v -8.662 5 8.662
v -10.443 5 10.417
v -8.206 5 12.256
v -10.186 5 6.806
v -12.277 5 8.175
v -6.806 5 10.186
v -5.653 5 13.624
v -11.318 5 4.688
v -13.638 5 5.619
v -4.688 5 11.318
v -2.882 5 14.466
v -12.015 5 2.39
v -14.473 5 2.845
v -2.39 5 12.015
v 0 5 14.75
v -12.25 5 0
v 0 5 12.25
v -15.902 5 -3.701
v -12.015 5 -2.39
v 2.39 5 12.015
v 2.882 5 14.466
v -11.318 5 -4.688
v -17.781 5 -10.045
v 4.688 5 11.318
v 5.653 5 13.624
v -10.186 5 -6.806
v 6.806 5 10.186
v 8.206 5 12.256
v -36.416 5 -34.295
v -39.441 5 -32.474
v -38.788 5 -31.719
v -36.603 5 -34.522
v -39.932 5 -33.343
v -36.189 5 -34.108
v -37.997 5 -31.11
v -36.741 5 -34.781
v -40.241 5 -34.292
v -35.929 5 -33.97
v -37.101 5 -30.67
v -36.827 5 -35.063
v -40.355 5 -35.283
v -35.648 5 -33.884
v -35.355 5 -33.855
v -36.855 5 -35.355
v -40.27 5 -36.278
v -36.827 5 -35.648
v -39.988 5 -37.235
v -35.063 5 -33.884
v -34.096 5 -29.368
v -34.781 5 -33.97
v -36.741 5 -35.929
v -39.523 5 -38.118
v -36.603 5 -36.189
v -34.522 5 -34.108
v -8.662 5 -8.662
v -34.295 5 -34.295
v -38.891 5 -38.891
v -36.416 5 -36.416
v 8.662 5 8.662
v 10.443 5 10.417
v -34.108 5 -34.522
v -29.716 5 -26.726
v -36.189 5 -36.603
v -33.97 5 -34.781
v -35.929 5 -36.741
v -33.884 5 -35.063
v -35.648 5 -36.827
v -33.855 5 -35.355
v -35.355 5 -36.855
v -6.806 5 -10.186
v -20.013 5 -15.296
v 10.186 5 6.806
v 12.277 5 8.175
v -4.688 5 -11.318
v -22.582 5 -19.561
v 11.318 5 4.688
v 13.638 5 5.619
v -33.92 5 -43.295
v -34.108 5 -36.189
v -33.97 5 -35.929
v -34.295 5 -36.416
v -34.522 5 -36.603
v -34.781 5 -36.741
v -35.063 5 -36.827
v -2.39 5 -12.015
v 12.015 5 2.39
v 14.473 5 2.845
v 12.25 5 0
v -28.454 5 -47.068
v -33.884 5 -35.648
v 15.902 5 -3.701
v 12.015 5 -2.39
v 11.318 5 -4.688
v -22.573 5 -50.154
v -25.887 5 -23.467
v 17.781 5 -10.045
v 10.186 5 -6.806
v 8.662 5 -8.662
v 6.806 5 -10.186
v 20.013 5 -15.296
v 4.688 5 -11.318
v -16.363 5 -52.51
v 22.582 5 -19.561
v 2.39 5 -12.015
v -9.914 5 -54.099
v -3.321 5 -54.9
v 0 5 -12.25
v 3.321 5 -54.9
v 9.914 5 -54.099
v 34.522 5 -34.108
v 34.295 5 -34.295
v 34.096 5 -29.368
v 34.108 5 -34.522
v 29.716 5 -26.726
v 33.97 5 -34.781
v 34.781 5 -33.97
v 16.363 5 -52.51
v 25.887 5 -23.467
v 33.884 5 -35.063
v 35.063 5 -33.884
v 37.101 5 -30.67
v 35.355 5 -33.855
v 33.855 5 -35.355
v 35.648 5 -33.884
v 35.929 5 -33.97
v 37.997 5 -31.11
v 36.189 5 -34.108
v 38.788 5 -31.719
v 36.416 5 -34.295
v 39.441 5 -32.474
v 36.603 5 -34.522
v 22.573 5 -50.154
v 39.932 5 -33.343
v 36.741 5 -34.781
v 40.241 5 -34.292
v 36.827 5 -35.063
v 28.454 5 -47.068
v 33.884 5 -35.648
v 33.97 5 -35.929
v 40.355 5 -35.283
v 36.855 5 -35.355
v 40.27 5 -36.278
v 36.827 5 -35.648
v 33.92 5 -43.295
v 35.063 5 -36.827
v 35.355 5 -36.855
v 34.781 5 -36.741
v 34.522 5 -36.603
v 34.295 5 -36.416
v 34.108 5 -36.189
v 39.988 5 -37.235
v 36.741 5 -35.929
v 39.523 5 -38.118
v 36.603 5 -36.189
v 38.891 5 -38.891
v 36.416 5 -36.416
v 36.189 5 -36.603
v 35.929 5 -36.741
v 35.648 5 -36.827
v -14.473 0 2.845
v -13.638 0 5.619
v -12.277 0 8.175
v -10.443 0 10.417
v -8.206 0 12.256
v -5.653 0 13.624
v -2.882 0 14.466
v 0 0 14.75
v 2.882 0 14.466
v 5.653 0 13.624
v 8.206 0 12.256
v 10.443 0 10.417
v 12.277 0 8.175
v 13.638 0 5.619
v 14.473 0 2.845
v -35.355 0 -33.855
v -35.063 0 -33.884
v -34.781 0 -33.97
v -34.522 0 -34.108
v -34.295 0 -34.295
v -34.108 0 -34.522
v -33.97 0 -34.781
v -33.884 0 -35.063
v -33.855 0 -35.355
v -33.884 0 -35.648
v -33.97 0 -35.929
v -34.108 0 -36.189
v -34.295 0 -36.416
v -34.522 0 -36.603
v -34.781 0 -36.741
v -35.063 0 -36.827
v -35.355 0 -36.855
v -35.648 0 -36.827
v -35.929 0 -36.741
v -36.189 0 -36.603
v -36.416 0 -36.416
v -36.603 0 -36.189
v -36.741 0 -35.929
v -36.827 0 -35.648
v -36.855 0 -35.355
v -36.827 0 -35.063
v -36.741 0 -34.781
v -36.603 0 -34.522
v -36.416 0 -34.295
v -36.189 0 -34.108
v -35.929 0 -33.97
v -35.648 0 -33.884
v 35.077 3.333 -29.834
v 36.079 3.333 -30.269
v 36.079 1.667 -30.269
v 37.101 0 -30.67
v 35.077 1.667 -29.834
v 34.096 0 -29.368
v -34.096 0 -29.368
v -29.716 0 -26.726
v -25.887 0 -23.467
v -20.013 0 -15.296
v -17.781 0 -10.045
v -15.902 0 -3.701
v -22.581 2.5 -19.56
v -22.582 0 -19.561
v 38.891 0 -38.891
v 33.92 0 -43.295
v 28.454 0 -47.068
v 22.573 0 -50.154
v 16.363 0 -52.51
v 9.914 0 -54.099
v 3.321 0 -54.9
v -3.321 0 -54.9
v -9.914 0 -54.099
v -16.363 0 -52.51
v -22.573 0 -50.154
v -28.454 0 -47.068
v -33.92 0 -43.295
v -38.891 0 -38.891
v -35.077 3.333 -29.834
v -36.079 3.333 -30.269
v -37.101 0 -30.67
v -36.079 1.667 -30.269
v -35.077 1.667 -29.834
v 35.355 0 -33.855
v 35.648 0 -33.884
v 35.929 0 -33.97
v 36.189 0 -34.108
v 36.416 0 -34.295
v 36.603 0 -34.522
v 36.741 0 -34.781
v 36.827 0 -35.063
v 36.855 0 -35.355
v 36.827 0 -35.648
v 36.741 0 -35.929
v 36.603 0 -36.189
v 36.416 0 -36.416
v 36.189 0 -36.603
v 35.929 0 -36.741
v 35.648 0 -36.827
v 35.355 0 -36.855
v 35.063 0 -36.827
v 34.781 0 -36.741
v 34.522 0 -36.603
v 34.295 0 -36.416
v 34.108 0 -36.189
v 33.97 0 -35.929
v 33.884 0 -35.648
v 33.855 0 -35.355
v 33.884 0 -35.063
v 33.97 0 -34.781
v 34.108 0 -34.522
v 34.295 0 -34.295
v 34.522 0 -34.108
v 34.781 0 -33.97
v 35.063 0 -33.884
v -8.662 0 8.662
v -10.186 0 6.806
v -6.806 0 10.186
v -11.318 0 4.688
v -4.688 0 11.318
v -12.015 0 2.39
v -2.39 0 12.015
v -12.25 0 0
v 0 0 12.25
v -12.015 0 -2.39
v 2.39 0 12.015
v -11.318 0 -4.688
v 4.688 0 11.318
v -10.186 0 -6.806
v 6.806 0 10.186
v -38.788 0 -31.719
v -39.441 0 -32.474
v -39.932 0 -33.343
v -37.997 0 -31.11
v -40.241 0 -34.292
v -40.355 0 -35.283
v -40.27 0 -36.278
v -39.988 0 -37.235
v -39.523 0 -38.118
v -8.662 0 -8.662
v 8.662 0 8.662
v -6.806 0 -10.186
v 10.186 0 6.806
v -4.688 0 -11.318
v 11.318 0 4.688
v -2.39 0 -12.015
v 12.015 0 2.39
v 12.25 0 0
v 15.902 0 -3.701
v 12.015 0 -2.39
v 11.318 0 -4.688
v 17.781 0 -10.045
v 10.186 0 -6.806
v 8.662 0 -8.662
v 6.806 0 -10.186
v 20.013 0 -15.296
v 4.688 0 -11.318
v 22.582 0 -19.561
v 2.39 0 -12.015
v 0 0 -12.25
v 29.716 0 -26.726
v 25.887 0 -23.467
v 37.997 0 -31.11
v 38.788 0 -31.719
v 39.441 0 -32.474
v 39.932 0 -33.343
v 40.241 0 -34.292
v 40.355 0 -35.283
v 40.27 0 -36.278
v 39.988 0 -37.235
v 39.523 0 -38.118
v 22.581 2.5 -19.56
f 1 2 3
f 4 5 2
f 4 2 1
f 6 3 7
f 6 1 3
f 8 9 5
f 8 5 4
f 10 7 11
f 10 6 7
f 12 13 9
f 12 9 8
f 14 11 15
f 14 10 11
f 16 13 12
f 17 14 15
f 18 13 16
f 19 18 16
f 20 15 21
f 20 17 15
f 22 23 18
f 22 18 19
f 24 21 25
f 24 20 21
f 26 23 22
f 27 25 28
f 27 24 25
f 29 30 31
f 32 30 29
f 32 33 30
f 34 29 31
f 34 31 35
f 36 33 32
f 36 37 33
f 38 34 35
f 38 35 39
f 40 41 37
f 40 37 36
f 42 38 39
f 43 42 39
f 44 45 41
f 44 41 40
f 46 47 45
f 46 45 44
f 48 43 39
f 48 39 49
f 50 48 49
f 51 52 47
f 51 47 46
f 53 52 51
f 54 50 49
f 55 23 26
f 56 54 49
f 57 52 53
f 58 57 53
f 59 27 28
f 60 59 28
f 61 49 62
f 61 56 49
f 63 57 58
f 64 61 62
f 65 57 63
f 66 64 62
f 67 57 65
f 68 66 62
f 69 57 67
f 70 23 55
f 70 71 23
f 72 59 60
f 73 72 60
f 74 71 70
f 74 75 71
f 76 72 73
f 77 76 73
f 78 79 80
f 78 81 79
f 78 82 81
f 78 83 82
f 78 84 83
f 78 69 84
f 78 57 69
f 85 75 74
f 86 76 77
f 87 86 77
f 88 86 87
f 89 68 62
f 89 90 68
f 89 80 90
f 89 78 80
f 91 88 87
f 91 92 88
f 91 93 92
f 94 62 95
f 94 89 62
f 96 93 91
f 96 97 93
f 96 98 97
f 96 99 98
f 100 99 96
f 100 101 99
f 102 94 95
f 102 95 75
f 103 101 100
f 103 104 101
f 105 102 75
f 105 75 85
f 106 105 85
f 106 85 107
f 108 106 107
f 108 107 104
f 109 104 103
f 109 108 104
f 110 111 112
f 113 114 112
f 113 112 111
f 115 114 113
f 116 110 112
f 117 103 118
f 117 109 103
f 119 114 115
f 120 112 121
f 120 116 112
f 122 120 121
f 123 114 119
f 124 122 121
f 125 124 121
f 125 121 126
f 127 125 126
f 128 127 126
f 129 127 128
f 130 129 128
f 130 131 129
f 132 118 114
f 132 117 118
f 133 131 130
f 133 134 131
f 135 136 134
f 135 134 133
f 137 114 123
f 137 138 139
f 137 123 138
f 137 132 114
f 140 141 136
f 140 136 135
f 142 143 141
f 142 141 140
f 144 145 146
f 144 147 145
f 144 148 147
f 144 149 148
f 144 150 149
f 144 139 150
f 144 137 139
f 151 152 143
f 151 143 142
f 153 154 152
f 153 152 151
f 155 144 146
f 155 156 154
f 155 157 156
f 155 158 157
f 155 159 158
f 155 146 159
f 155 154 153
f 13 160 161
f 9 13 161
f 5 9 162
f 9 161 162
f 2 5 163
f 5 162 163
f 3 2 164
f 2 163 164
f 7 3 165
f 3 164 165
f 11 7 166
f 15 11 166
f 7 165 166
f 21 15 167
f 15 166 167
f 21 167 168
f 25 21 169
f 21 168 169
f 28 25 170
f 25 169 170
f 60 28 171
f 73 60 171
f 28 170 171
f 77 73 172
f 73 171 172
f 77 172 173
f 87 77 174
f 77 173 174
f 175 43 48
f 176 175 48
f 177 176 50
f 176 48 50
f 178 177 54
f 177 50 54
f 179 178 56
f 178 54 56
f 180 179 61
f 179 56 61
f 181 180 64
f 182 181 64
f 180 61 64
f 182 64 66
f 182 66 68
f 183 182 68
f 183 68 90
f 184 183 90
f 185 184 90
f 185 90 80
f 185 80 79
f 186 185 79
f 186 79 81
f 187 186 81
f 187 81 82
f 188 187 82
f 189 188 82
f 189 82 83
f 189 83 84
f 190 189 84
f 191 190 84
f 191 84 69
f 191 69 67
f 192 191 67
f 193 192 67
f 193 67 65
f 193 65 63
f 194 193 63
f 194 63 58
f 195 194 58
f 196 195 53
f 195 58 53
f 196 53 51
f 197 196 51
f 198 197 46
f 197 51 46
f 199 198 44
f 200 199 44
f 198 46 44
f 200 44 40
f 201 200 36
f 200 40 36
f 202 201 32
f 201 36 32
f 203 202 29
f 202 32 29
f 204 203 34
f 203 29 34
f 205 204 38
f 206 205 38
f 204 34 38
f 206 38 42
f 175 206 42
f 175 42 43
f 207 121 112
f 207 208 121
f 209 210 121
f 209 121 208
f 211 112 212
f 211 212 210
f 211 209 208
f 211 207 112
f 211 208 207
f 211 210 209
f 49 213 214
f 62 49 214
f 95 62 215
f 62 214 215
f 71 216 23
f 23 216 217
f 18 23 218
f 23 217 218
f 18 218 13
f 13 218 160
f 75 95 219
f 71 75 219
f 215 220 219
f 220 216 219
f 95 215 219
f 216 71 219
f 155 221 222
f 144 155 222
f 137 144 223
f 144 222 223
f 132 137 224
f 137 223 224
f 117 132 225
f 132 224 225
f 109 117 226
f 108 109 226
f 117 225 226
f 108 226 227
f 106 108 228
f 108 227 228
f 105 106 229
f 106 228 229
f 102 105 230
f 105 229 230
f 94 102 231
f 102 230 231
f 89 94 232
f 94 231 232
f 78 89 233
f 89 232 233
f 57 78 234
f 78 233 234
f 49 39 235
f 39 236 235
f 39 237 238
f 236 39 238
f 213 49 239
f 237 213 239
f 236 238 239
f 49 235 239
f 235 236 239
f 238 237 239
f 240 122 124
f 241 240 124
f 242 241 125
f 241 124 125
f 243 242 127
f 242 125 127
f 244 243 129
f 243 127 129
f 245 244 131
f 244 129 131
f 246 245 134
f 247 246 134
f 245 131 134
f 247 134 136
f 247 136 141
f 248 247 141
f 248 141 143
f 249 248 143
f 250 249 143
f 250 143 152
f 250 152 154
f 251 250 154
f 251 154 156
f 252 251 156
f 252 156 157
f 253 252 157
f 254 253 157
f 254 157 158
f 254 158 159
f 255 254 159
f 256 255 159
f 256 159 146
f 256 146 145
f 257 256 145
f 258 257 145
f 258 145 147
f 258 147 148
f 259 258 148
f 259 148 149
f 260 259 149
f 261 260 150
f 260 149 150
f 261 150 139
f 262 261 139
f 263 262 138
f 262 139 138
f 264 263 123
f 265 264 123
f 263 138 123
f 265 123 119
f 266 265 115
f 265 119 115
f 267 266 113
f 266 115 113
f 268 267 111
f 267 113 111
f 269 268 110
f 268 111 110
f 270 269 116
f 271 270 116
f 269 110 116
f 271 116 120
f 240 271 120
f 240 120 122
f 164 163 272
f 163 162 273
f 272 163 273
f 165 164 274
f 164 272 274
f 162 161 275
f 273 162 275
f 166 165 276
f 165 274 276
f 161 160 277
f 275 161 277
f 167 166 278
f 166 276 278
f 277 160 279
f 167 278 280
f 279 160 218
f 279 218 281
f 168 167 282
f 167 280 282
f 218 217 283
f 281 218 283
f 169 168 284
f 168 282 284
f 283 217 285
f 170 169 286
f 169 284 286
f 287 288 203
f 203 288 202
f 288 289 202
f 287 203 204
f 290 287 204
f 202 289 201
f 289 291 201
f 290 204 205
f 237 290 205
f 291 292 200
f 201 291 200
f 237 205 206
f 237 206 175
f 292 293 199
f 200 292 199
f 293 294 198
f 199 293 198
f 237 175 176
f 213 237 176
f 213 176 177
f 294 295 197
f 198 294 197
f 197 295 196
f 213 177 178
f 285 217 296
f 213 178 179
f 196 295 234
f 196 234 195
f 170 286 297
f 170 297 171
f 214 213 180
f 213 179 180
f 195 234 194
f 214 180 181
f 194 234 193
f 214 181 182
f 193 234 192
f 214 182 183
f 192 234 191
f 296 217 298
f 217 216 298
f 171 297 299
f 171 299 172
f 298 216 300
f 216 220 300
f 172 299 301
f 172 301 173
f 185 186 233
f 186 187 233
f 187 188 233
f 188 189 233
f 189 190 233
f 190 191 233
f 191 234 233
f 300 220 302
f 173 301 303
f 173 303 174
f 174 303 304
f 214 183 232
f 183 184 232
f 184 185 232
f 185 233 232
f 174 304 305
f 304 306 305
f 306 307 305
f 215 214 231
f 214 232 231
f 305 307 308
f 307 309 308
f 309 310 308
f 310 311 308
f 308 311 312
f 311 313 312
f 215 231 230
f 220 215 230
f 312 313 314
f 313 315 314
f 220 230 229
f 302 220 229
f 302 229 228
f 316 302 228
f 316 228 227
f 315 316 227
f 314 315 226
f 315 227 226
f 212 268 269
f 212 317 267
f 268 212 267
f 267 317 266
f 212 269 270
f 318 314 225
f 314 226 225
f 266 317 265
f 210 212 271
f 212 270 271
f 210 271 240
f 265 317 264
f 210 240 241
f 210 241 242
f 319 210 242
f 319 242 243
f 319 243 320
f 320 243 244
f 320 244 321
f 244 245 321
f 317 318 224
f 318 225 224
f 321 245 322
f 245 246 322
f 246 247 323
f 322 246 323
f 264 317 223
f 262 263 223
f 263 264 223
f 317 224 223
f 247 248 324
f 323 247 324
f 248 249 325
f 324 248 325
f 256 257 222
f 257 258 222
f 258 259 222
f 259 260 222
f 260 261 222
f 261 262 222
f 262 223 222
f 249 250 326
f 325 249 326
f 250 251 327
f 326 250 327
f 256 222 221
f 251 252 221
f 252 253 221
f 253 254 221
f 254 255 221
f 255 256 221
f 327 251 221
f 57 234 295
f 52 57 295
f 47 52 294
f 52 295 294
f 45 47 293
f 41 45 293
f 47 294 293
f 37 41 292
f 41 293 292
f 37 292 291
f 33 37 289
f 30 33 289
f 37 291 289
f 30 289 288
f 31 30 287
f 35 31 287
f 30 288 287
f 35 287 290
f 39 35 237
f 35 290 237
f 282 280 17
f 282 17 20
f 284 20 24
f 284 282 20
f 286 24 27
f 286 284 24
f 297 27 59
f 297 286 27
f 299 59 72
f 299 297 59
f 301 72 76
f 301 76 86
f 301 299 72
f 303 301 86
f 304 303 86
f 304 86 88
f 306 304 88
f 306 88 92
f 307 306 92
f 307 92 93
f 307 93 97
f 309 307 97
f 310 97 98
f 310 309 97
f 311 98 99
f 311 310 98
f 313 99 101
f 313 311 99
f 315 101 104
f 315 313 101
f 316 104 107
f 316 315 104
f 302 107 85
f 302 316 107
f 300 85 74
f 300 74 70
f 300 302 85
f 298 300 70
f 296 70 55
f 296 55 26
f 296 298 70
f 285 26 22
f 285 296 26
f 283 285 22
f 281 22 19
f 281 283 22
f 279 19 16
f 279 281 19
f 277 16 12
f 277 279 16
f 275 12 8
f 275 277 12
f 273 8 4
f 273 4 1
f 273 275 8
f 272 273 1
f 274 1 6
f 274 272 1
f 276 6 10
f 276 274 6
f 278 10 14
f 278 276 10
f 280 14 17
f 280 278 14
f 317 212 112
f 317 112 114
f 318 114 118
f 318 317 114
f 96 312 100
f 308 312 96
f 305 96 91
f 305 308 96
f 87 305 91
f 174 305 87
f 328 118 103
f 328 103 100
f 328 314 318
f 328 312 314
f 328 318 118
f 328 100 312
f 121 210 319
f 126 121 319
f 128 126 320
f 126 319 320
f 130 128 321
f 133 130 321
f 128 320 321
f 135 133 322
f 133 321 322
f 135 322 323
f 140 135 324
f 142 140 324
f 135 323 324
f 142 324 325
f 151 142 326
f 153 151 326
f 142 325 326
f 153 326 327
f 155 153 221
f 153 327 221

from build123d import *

# Parameters (mm, degrees)
SKETCH2_R           = 12.25
BOSS_EXTRUDE1_DEPTH = 5
CUT_EXTRUDE1_REACH  = 70.4
SKETCH3_R           = 1.5


with BuildPart() as part:
    # Sketch2 → Boss-Extrude1 (new body)
    # profile 1 of 6: a face of its own
    with BuildSketch(Plane(origin=(0, 0, 0), x_dir=(1, 0, 0), z_dir=(0, 1, 0))):
        with BuildLine():
            ThreePointArc((-37.10126952, 30.670072063), (-34.291787618, 30.469762498), (-31.819805153, 31.819805153))
            Line((-31.819805153, 31.819805153), (-38.890872965, 38.890872965))
            ThreePointArc((-38.890872965, 38.890872965), (-40.24091562, 34.291787618), (-37.10126952, 30.670072063))
        make_face()
    # profile 2 of 6: a face of its own
    with BuildSketch(Plane(origin=(0, 0, 0), x_dir=(1, 0, 0), z_dir=(0, 1, 0))):
        with BuildLine():
            Line((-38.890872965, 38.890872965), (-31.819805153, 31.819805153))
            ThreePointArc((-31.819805153, 31.819805153), (0, 45), (31.819805153, 31.819805153))
            ThreePointArc((31.819805153, 31.819805153), (34.291787618, 30.469762498), (37.10126952, 30.670072063))
            ThreePointArc((37.10126952, 30.670072063), (40.24091562, 34.291787618), (38.890872965, 38.890872965))
            ThreePointArc((38.890872965, 38.890872965), (0, 55), (-38.890872965, 38.890872965))
        make_face()
    # profile 3 of 6: a face of its own
    with BuildSketch(Plane(origin=(0, 0, 0), x_dir=(1, 0, 0), z_dir=(0, 1, 0))):
        with BuildLine():
            ThreePointArc((31.819805153, 31.819805153), (0, 45), (-31.819805153, 31.819805153))
            ThreePointArc((-31.819805153, 31.819805153), (-32.980620877, 30.615006885), (-34.095849533, 29.367891389))
            add(Edge.make_bspline(
                [(-34.095849533, 29.367891389), (-29.412092921, 27.041011889), (-19.283887533, 18.248514738), (-16.048568895, 5.169213632), (-14.472968185, -2.845292938)],
                knots=[0.074524007, 0.074524007, 0.074524007, 0.074524007, 0.434164212, 1, 1, 1, 1], degree=3))
            ThreePointArc((-14.472968185, -2.845292938), (-1.42937386, 14.68057868), (14.75, 0))
            ThreePointArc((14.75, 0), (14.68057868, -1.42937386), (14.472968185, -2.845292938))
            add(Edge.make_bspline(
                [(34.095849533, 29.367891389), (29.412092921, 27.041011889), (19.283887533, 18.248514738), (16.048568895, 5.169213632), (14.472968185, -2.845292938)],
                knots=[0.074524007, 0.074524007, 0.074524007, 0.074524007, 0.434164212, 1, 1, 1, 1], degree=3))
            ThreePointArc((34.095849533, 29.367891389), (32.980620877, 30.615006885), (31.819805153, 31.819805153))
        make_face()
    # profile 4 of 6: a face of its own
    with BuildSketch(Plane(origin=(0, 0, 0), x_dir=(1, 0, 0), z_dir=(0, 1, 0))):
        with BuildLine():
            ThreePointArc((-34.095849533, 29.367891389), (-32.980620877, 30.615006885), (-31.819805153, 31.819805153))
            ThreePointArc((-31.819805153, 31.819805153), (-34.291787618, 30.469762498), (-37.10126952, 30.670072063))
            add(Edge.make_bspline(
                [(-37.10126952, 30.670072063), (-36.069084867, 30.285436005), (-35.066409295, 29.850063244), (-34.095849533, 29.367891389)],
                knots=[0, 0, 0, 0, 0.074524007, 0.074524007, 0.074524007, 0.074524007], degree=3))
        make_face()
    # profile 5 of 6: a face of its own
    with BuildSketch(Plane(origin=(0, 0, 0), x_dir=(1, 0, 0), z_dir=(0, 1, 0))):
        with BuildLine():
            ThreePointArc((37.10126952, 30.670072063), (34.291787618, 30.469762498), (31.819805153, 31.819805153))
            ThreePointArc((31.819805153, 31.819805153), (32.980620877, 30.615006885), (34.095849533, 29.367891389))
            add(Edge.make_bspline(
                [(37.10126952, 30.670072063), (36.069084867, 30.285436005), (35.066409295, 29.850063244), (34.095849533, 29.367891389)],
                knots=[0, 0, 0, 0, 0.074524007, 0.074524007, 0.074524007, 0.074524007], degree=3))
        make_face()
    # profile 6 of 6: a face of its own
    with BuildSketch(Plane(origin=(0, 0, 0), x_dir=(1, 0, 0), z_dir=(0, 1, 0))):
        with BuildLine():
            ThreePointArc((14.75, 0), (-1.42937386, 14.68057868), (-14.472968185, -2.845292938))
            ThreePointArc((-14.472968185, -2.845292938), (0, -14.75), (14.472968185, -2.845292938))
            ThreePointArc((14.472968185, -2.845292938), (14.68057868, -1.42937386), (14.75, 0))
        make_face()
        with Locations(Location((0, 0, 0), (0, 0, 270))):
            Circle(SKETCH2_R, mode=Mode.SUBTRACT)
    extrude(amount=BOSS_EXTRUDE1_DEPTH)

    # Sketch3 → Cut-Extrude1 (cut, up to next)
    with BuildSketch(Plane(origin=(0, 5, 0), x_dir=(1, 0, 0), z_dir=(0, 1, 0)), mode=Mode.PRIVATE) as cut_extrude1_sk1:
        with Locations(Location((-35.355339059, 35.355339059, 0), (0, 0, 270))):
            Circle(SKETCH3_R)
    cut_extrude1_tool1 = extrude(cut_extrude1_sk1.sketch, amount=-CUT_EXTRUDE1_REACH, mode=Mode.PRIVATE) & part.part
    # Sketch3 → Cut-Extrude1 (cut, up to next)
    with BuildSketch(Plane(origin=(0, 5, 0), x_dir=(1, 0, 0), z_dir=(0, 1, 0)), mode=Mode.PRIVATE) as cut_extrude1_sk2:
        with Locations(Location((35.355339059, 35.355339059, 0), (0, 0, 270))):
            Circle(SKETCH3_R)
    cut_extrude1_tool2 = extrude(cut_extrude1_sk2.sketch, amount=-CUT_EXTRUDE1_REACH, mode=Mode.PRIVATE) & part.part
    add(cut_extrude1_tool1.solids().sort_by_distance((-35.355339, 5, -35.355339))[0], mode=Mode.SUBTRACT)
    add(cut_extrude1_tool2.solids().sort_by_distance((35.355339, 5, -35.355339))[0], mode=Mode.SUBTRACT)


solid = part.part
